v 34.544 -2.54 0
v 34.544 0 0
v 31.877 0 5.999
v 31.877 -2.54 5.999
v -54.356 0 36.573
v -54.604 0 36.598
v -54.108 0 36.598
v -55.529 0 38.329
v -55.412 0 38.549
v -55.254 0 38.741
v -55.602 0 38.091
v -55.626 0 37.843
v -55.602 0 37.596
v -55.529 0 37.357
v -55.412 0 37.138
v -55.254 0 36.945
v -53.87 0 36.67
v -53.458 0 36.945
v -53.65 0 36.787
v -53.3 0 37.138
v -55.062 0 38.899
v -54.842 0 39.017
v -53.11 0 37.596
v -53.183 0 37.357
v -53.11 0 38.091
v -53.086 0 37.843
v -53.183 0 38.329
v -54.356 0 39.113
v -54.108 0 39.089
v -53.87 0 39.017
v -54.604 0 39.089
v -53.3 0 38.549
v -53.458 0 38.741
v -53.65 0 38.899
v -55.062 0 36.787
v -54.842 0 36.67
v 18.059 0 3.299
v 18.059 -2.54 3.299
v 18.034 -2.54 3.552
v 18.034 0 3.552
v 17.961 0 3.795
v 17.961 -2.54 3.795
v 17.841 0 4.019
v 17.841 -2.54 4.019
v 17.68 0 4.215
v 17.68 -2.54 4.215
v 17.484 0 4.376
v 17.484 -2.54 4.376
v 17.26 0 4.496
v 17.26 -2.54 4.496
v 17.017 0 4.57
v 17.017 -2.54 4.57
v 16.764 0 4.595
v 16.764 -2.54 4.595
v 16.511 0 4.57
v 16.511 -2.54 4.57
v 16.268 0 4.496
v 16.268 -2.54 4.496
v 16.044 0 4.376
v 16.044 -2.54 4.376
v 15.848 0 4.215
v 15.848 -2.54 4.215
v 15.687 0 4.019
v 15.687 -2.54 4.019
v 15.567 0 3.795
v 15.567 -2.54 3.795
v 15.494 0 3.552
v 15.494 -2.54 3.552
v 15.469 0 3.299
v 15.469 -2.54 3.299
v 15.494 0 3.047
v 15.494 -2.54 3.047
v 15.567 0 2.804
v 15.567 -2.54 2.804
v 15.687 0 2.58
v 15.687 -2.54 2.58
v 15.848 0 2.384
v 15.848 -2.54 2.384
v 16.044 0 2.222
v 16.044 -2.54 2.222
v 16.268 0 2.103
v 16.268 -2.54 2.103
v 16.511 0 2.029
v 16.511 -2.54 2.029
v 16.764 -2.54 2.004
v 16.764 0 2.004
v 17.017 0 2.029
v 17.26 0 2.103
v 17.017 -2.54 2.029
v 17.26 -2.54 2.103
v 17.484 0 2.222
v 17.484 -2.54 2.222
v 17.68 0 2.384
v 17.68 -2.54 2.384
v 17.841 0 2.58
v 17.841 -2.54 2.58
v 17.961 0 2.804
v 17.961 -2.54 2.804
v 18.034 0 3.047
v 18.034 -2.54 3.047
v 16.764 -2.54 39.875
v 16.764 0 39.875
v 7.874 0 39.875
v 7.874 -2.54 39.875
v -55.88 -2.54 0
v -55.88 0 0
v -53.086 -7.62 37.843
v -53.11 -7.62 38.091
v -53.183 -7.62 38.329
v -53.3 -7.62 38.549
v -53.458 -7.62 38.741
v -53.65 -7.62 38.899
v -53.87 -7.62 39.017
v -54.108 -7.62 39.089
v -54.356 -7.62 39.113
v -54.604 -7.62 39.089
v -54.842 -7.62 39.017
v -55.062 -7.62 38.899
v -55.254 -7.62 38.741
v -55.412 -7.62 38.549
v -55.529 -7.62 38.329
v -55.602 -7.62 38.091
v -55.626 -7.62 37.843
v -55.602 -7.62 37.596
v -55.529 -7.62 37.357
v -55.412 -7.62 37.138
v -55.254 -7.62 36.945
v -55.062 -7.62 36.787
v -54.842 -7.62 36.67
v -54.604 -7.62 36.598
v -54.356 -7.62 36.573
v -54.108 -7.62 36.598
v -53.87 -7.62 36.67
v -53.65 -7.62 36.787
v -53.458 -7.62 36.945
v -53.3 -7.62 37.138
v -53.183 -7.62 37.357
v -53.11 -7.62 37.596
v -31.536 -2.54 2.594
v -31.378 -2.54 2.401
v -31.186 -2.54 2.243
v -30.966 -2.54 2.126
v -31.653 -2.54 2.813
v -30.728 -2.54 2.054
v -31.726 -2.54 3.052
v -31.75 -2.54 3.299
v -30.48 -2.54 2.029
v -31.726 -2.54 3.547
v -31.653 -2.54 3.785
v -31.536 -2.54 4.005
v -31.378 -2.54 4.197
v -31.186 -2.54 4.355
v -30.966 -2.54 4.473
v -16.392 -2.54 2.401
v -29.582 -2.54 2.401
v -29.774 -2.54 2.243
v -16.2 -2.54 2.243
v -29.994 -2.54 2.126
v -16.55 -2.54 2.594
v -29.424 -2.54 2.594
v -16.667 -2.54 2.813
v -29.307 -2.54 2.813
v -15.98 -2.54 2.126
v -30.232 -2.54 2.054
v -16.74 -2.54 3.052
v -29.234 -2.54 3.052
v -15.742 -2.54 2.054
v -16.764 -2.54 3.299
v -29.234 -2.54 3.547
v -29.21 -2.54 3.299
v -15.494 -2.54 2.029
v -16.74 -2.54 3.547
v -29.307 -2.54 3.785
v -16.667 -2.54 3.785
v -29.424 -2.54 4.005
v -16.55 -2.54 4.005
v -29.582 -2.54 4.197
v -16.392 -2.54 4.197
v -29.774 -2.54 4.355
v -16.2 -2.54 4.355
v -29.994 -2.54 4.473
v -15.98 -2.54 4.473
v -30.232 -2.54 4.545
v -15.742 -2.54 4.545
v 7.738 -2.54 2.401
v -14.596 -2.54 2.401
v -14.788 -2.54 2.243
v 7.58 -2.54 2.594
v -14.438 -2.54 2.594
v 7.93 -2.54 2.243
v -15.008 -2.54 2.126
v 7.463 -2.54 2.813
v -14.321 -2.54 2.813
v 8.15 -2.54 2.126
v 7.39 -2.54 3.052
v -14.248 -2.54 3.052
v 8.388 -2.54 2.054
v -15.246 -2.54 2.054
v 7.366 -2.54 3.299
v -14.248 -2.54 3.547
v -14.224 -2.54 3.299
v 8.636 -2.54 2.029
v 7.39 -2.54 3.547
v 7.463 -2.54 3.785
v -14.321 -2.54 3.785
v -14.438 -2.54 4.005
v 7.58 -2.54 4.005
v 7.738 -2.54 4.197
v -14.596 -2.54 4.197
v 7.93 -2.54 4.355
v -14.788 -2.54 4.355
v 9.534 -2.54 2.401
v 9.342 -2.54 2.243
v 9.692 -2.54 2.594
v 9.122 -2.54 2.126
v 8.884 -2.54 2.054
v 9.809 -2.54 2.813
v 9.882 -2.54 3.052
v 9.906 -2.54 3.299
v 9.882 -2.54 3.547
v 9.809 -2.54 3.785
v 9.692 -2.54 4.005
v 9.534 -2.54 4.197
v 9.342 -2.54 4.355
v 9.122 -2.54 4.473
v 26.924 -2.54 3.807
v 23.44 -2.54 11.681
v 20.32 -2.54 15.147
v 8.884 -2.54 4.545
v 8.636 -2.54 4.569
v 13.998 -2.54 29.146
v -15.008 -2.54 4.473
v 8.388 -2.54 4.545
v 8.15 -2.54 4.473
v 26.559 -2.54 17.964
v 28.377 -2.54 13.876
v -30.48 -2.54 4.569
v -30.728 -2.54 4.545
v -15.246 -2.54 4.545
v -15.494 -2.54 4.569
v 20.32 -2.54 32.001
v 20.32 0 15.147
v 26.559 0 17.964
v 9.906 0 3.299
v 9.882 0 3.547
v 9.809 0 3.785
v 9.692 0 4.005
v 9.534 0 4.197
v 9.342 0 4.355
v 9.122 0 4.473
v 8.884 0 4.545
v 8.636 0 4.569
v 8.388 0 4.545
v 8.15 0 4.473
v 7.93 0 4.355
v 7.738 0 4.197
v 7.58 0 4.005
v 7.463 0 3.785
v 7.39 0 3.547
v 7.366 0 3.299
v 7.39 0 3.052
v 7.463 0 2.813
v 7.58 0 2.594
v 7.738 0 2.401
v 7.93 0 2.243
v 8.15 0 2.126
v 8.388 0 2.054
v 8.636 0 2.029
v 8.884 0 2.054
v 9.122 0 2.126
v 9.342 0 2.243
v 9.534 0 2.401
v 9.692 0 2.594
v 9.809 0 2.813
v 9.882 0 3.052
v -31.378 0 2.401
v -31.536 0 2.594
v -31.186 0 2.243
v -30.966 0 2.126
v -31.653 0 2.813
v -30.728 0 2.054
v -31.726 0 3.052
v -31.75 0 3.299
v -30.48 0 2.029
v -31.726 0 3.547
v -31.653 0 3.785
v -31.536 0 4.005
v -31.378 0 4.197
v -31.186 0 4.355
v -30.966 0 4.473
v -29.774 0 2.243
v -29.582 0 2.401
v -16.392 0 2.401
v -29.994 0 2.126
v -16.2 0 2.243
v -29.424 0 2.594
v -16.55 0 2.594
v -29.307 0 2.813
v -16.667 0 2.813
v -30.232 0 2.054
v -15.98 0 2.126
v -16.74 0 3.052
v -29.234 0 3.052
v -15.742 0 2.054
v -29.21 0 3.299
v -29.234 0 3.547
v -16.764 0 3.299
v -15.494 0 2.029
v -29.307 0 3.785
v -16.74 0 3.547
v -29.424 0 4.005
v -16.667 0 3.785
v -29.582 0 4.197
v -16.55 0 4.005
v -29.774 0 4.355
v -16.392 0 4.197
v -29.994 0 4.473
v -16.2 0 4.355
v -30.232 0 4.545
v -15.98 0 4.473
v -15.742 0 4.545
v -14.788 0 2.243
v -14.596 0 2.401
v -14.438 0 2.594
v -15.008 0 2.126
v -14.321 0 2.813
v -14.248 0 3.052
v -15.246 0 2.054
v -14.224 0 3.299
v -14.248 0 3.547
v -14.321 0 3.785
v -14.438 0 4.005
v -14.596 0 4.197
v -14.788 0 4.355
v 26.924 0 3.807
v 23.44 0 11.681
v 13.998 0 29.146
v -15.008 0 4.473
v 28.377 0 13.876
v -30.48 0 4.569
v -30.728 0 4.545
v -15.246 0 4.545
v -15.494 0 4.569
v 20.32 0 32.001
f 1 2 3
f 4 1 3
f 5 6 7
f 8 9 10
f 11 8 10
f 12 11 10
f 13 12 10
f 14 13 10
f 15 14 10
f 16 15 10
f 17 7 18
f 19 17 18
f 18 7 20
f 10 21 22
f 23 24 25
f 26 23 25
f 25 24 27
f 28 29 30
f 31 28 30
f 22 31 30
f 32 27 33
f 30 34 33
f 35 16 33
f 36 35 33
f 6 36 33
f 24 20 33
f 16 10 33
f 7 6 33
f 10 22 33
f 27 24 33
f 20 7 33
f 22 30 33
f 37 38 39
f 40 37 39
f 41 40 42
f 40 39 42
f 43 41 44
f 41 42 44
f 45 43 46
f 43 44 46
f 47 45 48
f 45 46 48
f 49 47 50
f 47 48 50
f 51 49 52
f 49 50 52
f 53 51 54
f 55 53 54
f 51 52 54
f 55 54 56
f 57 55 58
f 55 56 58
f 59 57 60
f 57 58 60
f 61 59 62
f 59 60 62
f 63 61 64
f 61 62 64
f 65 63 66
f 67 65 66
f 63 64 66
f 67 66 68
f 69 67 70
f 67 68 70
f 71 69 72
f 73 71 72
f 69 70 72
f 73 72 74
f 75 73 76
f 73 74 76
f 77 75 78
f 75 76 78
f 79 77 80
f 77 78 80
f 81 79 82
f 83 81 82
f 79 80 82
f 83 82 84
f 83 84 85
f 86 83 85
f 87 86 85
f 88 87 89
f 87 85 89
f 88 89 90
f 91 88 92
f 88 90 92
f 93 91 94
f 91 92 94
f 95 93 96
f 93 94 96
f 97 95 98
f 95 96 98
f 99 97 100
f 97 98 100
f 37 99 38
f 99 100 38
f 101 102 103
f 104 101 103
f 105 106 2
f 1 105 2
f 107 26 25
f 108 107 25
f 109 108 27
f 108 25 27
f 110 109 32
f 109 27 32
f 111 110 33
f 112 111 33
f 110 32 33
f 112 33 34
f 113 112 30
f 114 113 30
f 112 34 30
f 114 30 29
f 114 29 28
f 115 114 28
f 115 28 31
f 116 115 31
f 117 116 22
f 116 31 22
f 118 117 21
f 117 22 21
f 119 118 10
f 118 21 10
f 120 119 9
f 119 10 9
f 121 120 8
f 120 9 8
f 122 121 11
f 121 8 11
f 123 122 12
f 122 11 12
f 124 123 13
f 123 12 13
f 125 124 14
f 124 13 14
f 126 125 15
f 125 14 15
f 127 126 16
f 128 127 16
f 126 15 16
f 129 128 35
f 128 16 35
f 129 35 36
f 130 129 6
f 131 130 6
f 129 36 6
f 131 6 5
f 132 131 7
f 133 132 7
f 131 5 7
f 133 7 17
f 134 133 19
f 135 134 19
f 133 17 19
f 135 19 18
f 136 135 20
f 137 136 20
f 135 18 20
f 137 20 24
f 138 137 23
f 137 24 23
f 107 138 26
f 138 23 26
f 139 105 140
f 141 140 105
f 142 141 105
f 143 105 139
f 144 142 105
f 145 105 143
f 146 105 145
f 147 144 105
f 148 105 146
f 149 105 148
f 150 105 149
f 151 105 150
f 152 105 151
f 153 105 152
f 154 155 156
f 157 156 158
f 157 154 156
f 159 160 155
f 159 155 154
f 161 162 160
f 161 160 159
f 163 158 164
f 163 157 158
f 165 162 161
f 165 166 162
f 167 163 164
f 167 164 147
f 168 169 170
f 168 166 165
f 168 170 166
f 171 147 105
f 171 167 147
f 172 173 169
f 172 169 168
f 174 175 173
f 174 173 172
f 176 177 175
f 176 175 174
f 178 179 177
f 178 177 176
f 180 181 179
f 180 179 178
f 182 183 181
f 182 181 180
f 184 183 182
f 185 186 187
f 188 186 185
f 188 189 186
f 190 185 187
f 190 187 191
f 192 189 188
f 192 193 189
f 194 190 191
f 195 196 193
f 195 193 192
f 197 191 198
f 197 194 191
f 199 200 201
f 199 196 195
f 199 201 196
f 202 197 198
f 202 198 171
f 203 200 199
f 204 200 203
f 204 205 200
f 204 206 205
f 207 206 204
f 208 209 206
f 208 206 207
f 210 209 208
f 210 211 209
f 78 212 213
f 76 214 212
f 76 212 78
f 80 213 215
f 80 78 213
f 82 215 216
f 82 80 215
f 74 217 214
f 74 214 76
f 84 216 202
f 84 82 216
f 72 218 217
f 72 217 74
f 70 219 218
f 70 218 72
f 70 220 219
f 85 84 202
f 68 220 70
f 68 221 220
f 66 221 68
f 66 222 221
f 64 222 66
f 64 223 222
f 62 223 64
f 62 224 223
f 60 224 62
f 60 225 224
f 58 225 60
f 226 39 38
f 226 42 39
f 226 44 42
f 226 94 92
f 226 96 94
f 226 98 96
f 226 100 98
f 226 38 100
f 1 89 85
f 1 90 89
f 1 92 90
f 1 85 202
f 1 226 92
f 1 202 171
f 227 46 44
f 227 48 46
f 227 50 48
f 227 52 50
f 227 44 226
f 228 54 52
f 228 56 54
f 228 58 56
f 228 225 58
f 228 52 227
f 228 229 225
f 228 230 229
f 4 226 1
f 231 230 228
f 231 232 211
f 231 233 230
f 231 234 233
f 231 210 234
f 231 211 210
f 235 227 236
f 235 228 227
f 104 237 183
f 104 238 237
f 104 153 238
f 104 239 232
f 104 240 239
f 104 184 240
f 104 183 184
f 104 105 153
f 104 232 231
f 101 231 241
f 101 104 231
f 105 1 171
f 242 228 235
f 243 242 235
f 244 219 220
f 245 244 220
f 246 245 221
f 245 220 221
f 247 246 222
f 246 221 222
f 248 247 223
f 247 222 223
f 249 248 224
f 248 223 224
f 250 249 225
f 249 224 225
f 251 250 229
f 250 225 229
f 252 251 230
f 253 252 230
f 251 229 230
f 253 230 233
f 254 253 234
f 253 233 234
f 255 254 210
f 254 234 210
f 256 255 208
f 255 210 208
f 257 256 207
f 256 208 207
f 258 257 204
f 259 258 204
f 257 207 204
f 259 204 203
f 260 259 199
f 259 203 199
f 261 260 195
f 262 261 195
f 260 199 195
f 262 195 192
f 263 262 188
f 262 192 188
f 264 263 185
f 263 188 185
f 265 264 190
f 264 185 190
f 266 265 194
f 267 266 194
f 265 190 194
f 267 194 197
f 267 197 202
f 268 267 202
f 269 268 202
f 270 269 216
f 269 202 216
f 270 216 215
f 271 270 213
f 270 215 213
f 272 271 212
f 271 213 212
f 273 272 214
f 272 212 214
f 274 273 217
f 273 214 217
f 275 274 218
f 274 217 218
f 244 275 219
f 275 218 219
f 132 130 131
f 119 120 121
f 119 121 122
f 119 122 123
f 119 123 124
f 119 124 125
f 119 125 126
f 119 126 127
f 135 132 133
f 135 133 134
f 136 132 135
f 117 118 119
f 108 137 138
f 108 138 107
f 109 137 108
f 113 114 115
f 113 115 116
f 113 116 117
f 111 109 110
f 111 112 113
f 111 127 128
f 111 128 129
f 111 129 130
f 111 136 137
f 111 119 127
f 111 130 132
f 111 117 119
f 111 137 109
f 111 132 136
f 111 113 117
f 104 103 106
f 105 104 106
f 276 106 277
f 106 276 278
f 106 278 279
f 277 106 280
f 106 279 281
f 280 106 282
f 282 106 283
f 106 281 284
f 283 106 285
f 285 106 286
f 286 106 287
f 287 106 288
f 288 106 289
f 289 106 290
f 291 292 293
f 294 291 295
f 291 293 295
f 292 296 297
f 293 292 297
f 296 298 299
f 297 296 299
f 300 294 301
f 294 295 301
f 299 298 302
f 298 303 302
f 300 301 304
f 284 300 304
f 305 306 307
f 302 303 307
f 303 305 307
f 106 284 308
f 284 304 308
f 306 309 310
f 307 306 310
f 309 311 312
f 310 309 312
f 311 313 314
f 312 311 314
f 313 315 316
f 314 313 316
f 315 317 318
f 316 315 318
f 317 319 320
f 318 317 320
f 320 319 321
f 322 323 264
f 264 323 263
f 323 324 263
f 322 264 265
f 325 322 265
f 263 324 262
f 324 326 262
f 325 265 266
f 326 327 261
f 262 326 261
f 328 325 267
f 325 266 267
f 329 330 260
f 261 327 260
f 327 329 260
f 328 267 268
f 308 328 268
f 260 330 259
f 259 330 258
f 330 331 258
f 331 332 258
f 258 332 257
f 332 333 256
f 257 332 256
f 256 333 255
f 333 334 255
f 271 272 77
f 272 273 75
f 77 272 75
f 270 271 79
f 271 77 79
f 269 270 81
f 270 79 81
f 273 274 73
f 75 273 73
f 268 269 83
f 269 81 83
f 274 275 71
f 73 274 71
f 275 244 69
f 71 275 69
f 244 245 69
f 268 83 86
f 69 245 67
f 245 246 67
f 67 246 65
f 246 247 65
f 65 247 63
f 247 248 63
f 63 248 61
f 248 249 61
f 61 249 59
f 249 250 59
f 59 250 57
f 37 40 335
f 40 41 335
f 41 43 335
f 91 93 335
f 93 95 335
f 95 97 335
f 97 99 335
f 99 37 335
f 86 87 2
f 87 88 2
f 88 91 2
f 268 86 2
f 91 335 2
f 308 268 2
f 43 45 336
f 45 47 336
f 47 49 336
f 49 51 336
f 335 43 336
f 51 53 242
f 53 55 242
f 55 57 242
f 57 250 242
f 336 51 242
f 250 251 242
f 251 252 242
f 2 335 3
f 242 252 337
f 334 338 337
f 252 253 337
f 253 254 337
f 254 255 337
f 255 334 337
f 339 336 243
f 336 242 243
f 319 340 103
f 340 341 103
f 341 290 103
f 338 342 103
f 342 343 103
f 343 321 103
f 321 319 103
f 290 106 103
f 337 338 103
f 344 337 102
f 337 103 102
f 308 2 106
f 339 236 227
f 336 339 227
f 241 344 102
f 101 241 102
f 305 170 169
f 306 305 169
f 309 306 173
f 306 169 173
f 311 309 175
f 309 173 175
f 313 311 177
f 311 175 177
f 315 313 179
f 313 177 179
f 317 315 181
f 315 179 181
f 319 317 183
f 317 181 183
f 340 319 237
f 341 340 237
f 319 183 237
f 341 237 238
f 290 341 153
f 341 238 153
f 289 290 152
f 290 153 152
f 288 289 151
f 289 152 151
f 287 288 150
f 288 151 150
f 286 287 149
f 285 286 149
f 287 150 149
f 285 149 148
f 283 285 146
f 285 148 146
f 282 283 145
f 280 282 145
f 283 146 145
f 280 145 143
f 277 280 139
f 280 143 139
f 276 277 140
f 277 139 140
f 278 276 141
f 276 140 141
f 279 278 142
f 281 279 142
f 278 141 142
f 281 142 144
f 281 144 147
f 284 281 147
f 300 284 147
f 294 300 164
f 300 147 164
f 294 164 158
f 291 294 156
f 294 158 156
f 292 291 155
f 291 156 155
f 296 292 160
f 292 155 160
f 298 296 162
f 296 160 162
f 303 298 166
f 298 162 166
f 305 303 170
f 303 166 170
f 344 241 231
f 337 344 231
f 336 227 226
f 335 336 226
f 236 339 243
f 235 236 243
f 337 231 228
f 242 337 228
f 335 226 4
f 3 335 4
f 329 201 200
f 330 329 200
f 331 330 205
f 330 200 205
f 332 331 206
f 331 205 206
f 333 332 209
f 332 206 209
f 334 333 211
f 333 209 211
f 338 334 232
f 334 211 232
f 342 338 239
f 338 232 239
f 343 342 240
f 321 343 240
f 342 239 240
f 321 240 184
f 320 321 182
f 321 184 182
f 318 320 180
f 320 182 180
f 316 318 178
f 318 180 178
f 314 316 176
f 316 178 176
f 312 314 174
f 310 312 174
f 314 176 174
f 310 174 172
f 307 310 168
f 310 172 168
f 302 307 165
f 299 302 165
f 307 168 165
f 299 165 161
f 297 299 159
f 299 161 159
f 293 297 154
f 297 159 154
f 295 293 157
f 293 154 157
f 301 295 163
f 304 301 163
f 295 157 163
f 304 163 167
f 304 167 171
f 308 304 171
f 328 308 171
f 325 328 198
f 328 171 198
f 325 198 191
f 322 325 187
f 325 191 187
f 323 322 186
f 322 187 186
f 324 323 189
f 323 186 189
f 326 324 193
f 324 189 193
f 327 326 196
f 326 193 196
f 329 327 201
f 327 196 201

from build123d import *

# Parameters (mm, degrees)
F1_DEPTH  = 2.54
F3_DEPTH  = 25.4
F5_DEPTH  = 25.4
F6_R      = 1.6280471638
F7_DEPTH  = 5.08
F6_R_2    = 1.6056038369
F6_R_3    = 1.7780047962
F6_R_4    = 1.7956781563
F6_R_5    = 1.9333651296
F6_R_6    = 1.795676312
F10_R     = 1.2951508641
F10_R_2   = 1.2951526906
F11_DEPTH = 12.7
F12_R     = 1.2700002175
F12_R_2   = 1.2700017542
F12_R_3   = 1.2951526906
F13_DEPTH = 2.54
F14_R     = 1.2700021267
F15_DEPTH = 7.62


with BuildPart() as f1:
    # F0 (on Front) → F1 (new body)
    with BuildSketch(Plane.XZ):
        Polygon((7.8740008175, 39.8753546178), (-55.8800026774, 0), (34.5439985394, 0), (20.320000127, 32.0013538003), (16.7639981955, 39.8753546178), align=None)
    extrude(amount=F1_DEPTH)

    # F2 (on face) → F3 (cut)
    with BuildSketch(Plane.XZ.offset(2.54)):
        Polygon((26.5591864506, 17.964343729), (20.320000127, 32.0013538003), (13.9976617065, 29.1461029367), (20.320000127, 15.1466454417), align=None)
    extrude(amount=-F3_DEPTH, mode=Mode.SUBTRACT)

    # F4 (on face) → F5 (cut)
    with BuildSketch(Plane.XZ.offset(2.54)):
        Polygon((28.3765034583, 13.8757180948), (23.4395932888, 11.6813546047), (26.9239991903, 3.8073547184), (31.8774057447, 5.999338371), align=None)
    extrude(amount=-F5_DEPTH, mode=Mode.SUBTRACT)

    # F10 (on face) → F11 (cut)
    with BuildSketch(Plane(origin=(0, 0, 0), x_dir=(1, 0, 0), z_dir=(0, 0, -1))):
        with Locations((-31.7500010133, 4.0613547899)):
            Circle(F10_R)
        with Locations((-17.5260007381, 4.3153548613)):
            Circle(F10_R_2)
        with Locations((-4.8260008916, 4.3153548613)):
            Circle(F10_R_2)
        with Locations((8.890000172, 4.0613547899)):
            Circle(F10_R_2)
    extrude(amount=-F11_DEPTH, mode=Mode.SUBTRACT)

    # F12 (on face) → F13 (cut)
    with BuildSketch(Plane.XZ.offset(2.54)):
        with Locations((-30.4800011218, 3.2993548084)):
            Circle(F12_R)
        with Locations((-15.494001098, 3.2993548084)):
            Circle(F12_R_2)
        with Locations((8.6359987035, 3.2993548084)):
            Circle(F12_R_2)
        with Locations((16.7640019208, 3.2993548084)):
            Circle(F12_R_3)
    extrude(amount=-F13_DEPTH, mode=Mode.SUBTRACT)


with BuildPart() as f7:
    # F6 (on face) → F7 (new body, symmetric)
    with BuildSketch(Plane(origin=(0, 0, 0), x_dir=(1, 0, 0), z_dir=(0, 0, -1))):
        with Locations((-50.7999993861, 1.27)):
            Circle(F6_R)
    extrude(amount=F7_DEPTH, both=True)


with BuildPart() as f7b:
    # F6 (on face) → F7, piece 2 (new body, symmetric)
    with BuildSketch(Plane(origin=(0, 0, 0), x_dir=(1, 0, 0), z_dir=(0, 0, -1))):
        with Locations((-36.8300005794, 1.27)):
            Circle(F6_R_2)
    extrude(amount=F7_DEPTH, both=True)


with BuildPart() as f7c:
    # F6 (on face) → F7, piece 3 (new body, symmetric)
    with BuildSketch(Plane(origin=(0, 0, 0), x_dir=(1, 0, 0), z_dir=(0, 0, -1))):
        with Locations((-21.8440014869, 1.27)):
            Circle(F6_R_3)
    extrude(amount=F7_DEPTH, both=True)


with BuildPart() as f7d:
    # F6 (on face) → F7, piece 4 (new body, symmetric)
    with BuildSketch(Plane(origin=(0, 0, 0), x_dir=(1, 0, 0), z_dir=(0, 0, -1))):
        with Locations((-5.3339982405, 1.27)):
            Circle(F6_R_4)
    extrude(amount=F7_DEPTH, both=True)


with BuildPart() as f7e:
    # F6 (on face) → F7, piece 5 (new body, symmetric)
    with BuildSketch(Plane(origin=(0, 0, 0), x_dir=(1, 0, 0), z_dir=(0, 0, -1))):
        with Locations((9.1440016404, 1.27)):
            Circle(F6_R_5)
    extrude(amount=F7_DEPTH, both=True)


with BuildPart() as f7f:
    # F6 (on face) → F7, piece 6 (new body, symmetric)
    with BuildSketch(Plane(origin=(0, 0, 0), x_dir=(1, 0, 0), z_dir=(0, 0, -1))):
        with Locations((23.1139995158, 1.27)):
            Circle(F6_R_6)
    extrude(amount=F7_DEPTH, both=True)


with BuildPart() as f15:
    # F14 (on Front) → F15 (new body)
    with BuildSketch(Plane.XZ):
        with Locations((-54.3560013175, 37.8433577716)):
            Circle(F14_R)
    extrude(amount=F15_DEPTH)


solid = Compound([f1.part, f15.part])
